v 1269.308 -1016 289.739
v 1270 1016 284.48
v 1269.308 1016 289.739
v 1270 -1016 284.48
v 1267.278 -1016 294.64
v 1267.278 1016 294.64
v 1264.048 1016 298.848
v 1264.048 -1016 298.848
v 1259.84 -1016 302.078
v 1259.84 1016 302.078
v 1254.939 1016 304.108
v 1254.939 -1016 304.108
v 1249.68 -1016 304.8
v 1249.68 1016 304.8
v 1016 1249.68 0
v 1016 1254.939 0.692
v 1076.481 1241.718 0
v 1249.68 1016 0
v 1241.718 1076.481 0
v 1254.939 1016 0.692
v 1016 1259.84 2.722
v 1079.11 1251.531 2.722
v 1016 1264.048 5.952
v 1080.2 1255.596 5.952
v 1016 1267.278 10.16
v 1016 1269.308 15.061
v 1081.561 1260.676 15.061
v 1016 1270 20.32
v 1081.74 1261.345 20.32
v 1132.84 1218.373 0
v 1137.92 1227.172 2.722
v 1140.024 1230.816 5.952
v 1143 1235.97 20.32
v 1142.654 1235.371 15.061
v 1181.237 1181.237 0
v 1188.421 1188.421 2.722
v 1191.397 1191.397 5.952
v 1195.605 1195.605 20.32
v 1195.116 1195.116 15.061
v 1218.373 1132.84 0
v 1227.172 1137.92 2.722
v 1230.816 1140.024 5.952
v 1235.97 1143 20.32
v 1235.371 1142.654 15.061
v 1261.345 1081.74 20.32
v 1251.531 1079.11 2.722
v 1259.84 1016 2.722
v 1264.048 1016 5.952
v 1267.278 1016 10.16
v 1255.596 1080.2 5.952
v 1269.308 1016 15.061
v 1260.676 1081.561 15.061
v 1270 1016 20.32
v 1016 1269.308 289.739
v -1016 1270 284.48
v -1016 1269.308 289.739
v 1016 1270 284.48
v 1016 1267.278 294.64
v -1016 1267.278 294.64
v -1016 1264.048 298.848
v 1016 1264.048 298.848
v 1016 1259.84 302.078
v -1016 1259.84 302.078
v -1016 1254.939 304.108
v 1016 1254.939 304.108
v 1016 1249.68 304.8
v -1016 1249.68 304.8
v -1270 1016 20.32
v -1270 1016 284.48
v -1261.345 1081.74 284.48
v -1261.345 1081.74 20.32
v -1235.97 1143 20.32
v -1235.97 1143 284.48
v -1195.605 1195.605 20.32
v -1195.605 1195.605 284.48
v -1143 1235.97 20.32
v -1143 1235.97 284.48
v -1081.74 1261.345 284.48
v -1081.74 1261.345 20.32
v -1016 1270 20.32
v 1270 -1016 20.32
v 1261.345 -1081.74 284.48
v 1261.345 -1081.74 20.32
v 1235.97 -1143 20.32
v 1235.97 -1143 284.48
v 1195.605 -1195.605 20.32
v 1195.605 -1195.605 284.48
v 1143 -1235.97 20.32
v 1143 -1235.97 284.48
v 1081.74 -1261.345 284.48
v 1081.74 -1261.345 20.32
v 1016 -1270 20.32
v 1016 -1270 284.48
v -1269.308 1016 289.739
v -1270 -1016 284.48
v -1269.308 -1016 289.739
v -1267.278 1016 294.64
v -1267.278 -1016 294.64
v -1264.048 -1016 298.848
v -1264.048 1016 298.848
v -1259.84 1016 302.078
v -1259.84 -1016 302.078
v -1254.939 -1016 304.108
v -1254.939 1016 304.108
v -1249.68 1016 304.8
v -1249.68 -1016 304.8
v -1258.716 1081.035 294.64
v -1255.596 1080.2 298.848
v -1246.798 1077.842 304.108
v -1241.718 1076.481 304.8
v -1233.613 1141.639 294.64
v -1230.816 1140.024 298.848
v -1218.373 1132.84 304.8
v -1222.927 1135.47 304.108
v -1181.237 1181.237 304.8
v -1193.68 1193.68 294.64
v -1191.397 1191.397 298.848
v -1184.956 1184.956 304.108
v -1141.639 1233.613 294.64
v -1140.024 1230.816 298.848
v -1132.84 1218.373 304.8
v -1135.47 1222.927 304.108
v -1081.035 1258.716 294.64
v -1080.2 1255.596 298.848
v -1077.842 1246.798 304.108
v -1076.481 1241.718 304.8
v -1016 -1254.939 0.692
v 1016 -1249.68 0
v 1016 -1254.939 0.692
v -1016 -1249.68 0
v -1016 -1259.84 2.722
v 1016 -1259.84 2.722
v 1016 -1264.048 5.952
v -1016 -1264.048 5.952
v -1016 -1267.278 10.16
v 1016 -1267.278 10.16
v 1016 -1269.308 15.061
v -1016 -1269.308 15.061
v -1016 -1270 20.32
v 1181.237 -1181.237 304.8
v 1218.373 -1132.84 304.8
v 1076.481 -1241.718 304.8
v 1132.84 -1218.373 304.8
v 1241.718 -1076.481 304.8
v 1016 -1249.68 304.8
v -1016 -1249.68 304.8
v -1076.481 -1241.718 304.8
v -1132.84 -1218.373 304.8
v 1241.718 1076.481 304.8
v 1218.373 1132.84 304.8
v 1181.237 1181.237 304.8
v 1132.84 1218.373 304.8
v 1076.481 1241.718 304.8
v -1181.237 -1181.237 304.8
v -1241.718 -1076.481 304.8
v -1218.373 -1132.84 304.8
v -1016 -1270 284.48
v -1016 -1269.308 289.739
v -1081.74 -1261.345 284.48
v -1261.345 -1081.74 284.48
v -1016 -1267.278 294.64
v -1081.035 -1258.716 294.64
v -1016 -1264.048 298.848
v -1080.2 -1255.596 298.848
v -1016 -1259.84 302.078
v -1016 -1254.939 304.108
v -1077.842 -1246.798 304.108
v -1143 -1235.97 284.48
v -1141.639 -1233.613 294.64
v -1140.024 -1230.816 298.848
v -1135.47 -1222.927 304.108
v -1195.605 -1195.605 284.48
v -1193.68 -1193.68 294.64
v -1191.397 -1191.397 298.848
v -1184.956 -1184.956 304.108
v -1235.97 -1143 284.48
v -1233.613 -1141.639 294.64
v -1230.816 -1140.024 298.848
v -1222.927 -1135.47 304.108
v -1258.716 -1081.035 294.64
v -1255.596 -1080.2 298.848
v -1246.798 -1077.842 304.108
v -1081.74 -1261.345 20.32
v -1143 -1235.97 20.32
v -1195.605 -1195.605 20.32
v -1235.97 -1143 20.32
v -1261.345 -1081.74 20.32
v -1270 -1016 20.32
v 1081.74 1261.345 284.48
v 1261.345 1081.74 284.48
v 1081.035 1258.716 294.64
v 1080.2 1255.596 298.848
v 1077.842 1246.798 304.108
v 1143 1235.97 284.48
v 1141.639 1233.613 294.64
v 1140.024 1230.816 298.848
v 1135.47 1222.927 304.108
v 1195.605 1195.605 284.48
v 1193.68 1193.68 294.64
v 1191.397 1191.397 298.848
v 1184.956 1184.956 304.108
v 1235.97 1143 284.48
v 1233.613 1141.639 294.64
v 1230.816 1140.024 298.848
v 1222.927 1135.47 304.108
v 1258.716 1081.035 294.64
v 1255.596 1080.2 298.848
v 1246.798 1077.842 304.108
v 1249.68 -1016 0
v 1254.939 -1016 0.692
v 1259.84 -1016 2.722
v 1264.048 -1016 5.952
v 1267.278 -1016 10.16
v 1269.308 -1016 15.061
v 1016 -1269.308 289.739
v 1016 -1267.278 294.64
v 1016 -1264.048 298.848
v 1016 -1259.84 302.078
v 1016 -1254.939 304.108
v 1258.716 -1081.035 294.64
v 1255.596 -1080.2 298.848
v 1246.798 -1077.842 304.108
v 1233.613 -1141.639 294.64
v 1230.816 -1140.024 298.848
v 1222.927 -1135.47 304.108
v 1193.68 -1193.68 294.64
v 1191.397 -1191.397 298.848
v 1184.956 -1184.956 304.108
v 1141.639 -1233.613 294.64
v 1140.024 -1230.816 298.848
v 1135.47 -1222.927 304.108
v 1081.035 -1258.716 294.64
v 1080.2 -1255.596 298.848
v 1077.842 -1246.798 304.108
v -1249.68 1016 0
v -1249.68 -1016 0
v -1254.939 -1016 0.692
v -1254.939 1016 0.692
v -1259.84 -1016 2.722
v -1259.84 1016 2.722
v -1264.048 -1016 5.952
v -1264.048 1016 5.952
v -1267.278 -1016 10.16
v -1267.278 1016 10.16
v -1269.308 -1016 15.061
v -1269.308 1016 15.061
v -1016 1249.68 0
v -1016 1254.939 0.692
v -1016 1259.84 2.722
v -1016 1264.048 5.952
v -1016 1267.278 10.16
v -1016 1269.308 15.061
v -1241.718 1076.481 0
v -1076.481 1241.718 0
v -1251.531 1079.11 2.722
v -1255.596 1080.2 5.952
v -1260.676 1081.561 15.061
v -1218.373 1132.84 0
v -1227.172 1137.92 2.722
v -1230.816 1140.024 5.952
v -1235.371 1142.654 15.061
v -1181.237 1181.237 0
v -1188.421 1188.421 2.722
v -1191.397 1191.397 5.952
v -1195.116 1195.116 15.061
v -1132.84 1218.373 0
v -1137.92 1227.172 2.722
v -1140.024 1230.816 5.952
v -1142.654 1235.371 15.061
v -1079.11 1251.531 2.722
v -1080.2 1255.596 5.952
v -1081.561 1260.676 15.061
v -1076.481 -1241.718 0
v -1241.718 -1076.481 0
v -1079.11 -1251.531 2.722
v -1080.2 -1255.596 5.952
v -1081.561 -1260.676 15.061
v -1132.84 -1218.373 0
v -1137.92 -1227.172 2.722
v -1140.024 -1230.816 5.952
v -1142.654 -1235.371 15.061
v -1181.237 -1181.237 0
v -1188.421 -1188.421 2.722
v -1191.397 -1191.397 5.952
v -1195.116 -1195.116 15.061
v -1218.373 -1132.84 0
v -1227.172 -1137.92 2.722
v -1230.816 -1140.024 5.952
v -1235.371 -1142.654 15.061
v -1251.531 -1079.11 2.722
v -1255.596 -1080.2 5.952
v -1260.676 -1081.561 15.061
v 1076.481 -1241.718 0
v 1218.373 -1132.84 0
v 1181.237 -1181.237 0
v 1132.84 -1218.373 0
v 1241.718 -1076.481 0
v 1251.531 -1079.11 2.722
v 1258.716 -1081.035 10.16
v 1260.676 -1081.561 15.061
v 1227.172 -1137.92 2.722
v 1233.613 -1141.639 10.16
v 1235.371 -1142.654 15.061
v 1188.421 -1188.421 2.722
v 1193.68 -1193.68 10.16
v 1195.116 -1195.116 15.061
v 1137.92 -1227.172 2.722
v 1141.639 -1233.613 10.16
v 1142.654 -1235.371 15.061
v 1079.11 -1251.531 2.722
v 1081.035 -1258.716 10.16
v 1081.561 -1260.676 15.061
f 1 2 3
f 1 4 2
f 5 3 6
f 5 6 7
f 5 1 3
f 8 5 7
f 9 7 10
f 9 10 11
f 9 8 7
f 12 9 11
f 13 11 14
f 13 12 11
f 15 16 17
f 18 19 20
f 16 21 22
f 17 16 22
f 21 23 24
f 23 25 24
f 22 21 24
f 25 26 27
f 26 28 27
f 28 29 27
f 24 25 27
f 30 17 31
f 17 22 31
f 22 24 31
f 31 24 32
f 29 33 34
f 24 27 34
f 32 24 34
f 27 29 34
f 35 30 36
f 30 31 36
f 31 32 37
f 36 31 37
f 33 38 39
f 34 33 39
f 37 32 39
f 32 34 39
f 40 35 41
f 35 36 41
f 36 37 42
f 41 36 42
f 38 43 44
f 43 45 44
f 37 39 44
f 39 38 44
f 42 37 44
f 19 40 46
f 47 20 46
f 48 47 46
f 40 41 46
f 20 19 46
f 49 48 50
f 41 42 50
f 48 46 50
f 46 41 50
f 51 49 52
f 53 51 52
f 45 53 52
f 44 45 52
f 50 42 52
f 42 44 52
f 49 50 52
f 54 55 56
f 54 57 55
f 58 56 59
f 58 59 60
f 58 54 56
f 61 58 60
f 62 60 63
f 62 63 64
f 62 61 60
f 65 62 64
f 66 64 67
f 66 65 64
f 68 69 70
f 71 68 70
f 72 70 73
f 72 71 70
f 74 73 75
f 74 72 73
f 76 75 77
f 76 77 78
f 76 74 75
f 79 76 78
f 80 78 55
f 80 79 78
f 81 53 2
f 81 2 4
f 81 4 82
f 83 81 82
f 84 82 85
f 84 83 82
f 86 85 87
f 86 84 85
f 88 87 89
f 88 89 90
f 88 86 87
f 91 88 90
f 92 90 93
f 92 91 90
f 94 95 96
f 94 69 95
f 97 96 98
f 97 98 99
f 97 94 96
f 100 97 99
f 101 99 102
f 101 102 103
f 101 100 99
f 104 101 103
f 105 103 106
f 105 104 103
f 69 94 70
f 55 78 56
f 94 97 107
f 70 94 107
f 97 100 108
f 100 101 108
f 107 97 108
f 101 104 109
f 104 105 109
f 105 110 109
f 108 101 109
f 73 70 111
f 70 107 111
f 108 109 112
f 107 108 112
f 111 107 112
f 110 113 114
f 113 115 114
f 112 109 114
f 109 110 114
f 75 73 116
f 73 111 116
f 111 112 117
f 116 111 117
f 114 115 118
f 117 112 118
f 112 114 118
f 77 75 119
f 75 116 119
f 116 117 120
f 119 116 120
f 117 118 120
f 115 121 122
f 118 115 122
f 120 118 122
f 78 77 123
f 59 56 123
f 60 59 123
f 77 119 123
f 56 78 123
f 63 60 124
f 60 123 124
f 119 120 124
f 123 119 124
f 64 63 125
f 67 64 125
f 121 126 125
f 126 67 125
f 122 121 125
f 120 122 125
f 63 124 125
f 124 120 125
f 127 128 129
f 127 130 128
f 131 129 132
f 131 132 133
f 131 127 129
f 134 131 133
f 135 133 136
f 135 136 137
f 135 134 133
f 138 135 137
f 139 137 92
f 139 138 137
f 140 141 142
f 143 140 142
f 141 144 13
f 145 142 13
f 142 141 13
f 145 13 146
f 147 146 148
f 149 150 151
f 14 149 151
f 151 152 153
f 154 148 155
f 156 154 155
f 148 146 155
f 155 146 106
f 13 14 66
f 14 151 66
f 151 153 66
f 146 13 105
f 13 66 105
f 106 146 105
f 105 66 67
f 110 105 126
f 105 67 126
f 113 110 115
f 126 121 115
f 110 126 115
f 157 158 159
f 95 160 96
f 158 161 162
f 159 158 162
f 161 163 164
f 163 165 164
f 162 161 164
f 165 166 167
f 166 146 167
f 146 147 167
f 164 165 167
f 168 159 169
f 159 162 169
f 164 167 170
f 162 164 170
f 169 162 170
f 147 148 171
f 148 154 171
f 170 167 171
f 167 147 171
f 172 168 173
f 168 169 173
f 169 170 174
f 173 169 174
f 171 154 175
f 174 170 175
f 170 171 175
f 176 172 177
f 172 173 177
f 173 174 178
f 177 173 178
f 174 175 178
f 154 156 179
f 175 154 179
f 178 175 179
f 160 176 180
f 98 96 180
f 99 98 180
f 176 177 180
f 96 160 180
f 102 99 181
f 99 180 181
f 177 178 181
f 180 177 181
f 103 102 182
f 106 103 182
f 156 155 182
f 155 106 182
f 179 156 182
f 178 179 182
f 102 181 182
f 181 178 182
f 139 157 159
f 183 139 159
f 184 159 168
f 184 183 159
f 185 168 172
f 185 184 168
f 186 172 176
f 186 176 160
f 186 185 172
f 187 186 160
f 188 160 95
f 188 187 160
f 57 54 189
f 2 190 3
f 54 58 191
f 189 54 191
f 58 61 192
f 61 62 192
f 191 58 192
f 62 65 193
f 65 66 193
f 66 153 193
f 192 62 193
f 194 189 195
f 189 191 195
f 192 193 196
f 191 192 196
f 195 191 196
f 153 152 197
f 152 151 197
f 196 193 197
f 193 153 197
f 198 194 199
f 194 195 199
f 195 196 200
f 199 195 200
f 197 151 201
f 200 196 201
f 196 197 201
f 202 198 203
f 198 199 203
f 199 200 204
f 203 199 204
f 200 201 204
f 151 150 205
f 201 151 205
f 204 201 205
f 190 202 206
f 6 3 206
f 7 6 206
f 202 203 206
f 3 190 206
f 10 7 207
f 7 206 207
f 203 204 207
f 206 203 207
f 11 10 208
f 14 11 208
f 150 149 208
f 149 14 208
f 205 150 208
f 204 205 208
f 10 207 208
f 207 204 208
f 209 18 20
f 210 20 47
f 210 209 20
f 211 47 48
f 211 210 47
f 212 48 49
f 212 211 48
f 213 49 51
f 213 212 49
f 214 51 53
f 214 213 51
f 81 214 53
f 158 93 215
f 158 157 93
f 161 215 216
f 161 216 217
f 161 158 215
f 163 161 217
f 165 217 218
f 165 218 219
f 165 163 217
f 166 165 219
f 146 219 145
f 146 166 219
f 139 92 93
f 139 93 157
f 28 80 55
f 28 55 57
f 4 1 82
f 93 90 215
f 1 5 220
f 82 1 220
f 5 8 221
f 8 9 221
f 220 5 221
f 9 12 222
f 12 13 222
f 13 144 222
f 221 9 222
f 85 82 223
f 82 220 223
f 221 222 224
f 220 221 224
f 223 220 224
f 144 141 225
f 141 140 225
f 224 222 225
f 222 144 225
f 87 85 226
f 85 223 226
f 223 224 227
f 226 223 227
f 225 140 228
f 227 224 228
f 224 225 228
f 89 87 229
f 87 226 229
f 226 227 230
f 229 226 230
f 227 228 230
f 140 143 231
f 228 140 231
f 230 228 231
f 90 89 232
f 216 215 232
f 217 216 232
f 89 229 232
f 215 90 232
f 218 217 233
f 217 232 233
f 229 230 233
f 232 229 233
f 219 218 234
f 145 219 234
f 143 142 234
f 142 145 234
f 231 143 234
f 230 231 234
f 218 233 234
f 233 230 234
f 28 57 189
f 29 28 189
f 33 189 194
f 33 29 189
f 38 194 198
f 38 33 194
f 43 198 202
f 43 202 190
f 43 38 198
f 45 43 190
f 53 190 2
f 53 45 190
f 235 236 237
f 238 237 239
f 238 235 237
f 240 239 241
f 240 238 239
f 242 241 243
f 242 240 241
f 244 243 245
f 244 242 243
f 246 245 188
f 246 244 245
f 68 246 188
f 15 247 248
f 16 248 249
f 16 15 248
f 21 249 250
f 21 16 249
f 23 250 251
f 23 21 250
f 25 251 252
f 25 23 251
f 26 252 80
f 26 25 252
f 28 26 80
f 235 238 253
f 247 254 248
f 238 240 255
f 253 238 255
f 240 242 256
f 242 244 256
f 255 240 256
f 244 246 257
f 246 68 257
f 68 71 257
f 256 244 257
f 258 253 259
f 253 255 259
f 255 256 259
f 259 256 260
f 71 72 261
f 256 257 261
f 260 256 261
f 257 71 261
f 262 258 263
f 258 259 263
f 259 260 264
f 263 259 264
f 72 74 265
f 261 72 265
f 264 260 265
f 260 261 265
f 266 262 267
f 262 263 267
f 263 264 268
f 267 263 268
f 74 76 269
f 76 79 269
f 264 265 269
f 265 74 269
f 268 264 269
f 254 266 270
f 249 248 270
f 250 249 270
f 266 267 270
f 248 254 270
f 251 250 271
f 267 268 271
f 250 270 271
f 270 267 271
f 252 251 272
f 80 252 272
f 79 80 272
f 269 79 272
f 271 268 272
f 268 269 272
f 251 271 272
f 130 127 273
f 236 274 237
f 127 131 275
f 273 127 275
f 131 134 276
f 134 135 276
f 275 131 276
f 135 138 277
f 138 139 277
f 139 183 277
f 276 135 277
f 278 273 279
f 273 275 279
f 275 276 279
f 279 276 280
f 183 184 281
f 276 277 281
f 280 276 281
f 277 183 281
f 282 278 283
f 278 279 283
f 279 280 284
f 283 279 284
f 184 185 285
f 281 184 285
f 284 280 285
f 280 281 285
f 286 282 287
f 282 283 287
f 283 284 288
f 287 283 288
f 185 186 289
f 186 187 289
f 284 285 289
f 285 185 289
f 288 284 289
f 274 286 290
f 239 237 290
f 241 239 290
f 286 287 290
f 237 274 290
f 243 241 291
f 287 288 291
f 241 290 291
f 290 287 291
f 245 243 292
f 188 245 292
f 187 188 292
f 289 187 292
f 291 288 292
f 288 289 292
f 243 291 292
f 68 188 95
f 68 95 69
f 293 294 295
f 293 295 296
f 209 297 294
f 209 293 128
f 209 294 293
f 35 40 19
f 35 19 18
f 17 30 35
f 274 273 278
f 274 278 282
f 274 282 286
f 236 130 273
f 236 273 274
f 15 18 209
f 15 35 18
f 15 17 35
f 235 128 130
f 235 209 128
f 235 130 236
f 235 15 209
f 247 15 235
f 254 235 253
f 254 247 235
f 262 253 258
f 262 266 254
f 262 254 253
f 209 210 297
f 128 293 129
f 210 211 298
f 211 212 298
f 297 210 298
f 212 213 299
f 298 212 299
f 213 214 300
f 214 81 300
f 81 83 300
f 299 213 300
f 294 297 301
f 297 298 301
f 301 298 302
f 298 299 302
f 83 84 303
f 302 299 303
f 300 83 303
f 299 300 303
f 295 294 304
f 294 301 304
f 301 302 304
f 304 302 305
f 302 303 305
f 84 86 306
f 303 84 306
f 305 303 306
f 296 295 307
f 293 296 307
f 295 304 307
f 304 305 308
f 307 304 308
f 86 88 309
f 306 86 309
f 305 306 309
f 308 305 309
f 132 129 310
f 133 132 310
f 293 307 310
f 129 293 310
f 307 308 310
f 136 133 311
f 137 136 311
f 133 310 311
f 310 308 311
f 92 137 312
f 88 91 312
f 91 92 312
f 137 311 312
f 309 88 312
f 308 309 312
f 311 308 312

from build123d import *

# Parameters (mm, degrees)
BOSS_EXTRUDE1_DEPTH = 304.8
FILLET2_R           = 20.32
FILLET3_R           = 20.32


with BuildPart() as part:
    # Sketch1 → Boss-Extrude1 (new body)
    with BuildSketch(Plane.XY):
        with BuildLine():
            Line((-1016, 1270), (1016, 1270))
            ThreePointArc((1016, 1270), (1195.605122421, 1195.605122421), (1270, 1016))
            Line((1270, 1016), (1270, -1016))
            ThreePointArc((1270, -1016), (1195.605122421, -1195.605122421), (1016, -1270))
            Line((1016, -1270), (-1016, -1270))
            ThreePointArc((-1016, -1270), (-1195.605122421, -1195.605122421), (-1270, -1016))
            Line((-1270, -1016), (-1270, 1016))
            ThreePointArc((-1270, 1016), (-1195.605122421, 1195.605122421), (-1016, 1270))
        make_face()
    extrude(amount=BOSS_EXTRUDE1_DEPTH)

    # Fillet2
    fillet2_edges = [part.edges().sort_by_distance(p)[0] for p in [
        (-1195.605122421, -1195.605122421, 304.8),
        (0, -1270, 304.8),
        (1195.605122421, -1195.605122421, 304.8),
        (1270, 0, 304.8),
        (1195.605122421, 1195.605122421, 304.8),
        (0, 1270, 304.8),
        (-1195.605122421, 1195.605122421, 304.8),
        (-1270, 0, 304.8),
    ]]
    fillet(fillet2_edges, radius=FILLET2_R)

    # Fillet3
    fillet3_edges = [part.edges().sort_by_distance(p)[0] for p in [
        (0, -1270, 0),
        (-1195.605122421, -1195.605122421, 0),
        (-1270, 0, 0),
        (-1195.605122421, 1195.605122421, 0),
        (0, 1270, 0),
        (1195.605122421, 1195.605122421, 0),
        (1270, 0, 0),
        (1195.605122421, -1195.605122421, 0),
    ]]
    fillet(fillet3_edges, radius=FILLET3_R)


solid = part.part
